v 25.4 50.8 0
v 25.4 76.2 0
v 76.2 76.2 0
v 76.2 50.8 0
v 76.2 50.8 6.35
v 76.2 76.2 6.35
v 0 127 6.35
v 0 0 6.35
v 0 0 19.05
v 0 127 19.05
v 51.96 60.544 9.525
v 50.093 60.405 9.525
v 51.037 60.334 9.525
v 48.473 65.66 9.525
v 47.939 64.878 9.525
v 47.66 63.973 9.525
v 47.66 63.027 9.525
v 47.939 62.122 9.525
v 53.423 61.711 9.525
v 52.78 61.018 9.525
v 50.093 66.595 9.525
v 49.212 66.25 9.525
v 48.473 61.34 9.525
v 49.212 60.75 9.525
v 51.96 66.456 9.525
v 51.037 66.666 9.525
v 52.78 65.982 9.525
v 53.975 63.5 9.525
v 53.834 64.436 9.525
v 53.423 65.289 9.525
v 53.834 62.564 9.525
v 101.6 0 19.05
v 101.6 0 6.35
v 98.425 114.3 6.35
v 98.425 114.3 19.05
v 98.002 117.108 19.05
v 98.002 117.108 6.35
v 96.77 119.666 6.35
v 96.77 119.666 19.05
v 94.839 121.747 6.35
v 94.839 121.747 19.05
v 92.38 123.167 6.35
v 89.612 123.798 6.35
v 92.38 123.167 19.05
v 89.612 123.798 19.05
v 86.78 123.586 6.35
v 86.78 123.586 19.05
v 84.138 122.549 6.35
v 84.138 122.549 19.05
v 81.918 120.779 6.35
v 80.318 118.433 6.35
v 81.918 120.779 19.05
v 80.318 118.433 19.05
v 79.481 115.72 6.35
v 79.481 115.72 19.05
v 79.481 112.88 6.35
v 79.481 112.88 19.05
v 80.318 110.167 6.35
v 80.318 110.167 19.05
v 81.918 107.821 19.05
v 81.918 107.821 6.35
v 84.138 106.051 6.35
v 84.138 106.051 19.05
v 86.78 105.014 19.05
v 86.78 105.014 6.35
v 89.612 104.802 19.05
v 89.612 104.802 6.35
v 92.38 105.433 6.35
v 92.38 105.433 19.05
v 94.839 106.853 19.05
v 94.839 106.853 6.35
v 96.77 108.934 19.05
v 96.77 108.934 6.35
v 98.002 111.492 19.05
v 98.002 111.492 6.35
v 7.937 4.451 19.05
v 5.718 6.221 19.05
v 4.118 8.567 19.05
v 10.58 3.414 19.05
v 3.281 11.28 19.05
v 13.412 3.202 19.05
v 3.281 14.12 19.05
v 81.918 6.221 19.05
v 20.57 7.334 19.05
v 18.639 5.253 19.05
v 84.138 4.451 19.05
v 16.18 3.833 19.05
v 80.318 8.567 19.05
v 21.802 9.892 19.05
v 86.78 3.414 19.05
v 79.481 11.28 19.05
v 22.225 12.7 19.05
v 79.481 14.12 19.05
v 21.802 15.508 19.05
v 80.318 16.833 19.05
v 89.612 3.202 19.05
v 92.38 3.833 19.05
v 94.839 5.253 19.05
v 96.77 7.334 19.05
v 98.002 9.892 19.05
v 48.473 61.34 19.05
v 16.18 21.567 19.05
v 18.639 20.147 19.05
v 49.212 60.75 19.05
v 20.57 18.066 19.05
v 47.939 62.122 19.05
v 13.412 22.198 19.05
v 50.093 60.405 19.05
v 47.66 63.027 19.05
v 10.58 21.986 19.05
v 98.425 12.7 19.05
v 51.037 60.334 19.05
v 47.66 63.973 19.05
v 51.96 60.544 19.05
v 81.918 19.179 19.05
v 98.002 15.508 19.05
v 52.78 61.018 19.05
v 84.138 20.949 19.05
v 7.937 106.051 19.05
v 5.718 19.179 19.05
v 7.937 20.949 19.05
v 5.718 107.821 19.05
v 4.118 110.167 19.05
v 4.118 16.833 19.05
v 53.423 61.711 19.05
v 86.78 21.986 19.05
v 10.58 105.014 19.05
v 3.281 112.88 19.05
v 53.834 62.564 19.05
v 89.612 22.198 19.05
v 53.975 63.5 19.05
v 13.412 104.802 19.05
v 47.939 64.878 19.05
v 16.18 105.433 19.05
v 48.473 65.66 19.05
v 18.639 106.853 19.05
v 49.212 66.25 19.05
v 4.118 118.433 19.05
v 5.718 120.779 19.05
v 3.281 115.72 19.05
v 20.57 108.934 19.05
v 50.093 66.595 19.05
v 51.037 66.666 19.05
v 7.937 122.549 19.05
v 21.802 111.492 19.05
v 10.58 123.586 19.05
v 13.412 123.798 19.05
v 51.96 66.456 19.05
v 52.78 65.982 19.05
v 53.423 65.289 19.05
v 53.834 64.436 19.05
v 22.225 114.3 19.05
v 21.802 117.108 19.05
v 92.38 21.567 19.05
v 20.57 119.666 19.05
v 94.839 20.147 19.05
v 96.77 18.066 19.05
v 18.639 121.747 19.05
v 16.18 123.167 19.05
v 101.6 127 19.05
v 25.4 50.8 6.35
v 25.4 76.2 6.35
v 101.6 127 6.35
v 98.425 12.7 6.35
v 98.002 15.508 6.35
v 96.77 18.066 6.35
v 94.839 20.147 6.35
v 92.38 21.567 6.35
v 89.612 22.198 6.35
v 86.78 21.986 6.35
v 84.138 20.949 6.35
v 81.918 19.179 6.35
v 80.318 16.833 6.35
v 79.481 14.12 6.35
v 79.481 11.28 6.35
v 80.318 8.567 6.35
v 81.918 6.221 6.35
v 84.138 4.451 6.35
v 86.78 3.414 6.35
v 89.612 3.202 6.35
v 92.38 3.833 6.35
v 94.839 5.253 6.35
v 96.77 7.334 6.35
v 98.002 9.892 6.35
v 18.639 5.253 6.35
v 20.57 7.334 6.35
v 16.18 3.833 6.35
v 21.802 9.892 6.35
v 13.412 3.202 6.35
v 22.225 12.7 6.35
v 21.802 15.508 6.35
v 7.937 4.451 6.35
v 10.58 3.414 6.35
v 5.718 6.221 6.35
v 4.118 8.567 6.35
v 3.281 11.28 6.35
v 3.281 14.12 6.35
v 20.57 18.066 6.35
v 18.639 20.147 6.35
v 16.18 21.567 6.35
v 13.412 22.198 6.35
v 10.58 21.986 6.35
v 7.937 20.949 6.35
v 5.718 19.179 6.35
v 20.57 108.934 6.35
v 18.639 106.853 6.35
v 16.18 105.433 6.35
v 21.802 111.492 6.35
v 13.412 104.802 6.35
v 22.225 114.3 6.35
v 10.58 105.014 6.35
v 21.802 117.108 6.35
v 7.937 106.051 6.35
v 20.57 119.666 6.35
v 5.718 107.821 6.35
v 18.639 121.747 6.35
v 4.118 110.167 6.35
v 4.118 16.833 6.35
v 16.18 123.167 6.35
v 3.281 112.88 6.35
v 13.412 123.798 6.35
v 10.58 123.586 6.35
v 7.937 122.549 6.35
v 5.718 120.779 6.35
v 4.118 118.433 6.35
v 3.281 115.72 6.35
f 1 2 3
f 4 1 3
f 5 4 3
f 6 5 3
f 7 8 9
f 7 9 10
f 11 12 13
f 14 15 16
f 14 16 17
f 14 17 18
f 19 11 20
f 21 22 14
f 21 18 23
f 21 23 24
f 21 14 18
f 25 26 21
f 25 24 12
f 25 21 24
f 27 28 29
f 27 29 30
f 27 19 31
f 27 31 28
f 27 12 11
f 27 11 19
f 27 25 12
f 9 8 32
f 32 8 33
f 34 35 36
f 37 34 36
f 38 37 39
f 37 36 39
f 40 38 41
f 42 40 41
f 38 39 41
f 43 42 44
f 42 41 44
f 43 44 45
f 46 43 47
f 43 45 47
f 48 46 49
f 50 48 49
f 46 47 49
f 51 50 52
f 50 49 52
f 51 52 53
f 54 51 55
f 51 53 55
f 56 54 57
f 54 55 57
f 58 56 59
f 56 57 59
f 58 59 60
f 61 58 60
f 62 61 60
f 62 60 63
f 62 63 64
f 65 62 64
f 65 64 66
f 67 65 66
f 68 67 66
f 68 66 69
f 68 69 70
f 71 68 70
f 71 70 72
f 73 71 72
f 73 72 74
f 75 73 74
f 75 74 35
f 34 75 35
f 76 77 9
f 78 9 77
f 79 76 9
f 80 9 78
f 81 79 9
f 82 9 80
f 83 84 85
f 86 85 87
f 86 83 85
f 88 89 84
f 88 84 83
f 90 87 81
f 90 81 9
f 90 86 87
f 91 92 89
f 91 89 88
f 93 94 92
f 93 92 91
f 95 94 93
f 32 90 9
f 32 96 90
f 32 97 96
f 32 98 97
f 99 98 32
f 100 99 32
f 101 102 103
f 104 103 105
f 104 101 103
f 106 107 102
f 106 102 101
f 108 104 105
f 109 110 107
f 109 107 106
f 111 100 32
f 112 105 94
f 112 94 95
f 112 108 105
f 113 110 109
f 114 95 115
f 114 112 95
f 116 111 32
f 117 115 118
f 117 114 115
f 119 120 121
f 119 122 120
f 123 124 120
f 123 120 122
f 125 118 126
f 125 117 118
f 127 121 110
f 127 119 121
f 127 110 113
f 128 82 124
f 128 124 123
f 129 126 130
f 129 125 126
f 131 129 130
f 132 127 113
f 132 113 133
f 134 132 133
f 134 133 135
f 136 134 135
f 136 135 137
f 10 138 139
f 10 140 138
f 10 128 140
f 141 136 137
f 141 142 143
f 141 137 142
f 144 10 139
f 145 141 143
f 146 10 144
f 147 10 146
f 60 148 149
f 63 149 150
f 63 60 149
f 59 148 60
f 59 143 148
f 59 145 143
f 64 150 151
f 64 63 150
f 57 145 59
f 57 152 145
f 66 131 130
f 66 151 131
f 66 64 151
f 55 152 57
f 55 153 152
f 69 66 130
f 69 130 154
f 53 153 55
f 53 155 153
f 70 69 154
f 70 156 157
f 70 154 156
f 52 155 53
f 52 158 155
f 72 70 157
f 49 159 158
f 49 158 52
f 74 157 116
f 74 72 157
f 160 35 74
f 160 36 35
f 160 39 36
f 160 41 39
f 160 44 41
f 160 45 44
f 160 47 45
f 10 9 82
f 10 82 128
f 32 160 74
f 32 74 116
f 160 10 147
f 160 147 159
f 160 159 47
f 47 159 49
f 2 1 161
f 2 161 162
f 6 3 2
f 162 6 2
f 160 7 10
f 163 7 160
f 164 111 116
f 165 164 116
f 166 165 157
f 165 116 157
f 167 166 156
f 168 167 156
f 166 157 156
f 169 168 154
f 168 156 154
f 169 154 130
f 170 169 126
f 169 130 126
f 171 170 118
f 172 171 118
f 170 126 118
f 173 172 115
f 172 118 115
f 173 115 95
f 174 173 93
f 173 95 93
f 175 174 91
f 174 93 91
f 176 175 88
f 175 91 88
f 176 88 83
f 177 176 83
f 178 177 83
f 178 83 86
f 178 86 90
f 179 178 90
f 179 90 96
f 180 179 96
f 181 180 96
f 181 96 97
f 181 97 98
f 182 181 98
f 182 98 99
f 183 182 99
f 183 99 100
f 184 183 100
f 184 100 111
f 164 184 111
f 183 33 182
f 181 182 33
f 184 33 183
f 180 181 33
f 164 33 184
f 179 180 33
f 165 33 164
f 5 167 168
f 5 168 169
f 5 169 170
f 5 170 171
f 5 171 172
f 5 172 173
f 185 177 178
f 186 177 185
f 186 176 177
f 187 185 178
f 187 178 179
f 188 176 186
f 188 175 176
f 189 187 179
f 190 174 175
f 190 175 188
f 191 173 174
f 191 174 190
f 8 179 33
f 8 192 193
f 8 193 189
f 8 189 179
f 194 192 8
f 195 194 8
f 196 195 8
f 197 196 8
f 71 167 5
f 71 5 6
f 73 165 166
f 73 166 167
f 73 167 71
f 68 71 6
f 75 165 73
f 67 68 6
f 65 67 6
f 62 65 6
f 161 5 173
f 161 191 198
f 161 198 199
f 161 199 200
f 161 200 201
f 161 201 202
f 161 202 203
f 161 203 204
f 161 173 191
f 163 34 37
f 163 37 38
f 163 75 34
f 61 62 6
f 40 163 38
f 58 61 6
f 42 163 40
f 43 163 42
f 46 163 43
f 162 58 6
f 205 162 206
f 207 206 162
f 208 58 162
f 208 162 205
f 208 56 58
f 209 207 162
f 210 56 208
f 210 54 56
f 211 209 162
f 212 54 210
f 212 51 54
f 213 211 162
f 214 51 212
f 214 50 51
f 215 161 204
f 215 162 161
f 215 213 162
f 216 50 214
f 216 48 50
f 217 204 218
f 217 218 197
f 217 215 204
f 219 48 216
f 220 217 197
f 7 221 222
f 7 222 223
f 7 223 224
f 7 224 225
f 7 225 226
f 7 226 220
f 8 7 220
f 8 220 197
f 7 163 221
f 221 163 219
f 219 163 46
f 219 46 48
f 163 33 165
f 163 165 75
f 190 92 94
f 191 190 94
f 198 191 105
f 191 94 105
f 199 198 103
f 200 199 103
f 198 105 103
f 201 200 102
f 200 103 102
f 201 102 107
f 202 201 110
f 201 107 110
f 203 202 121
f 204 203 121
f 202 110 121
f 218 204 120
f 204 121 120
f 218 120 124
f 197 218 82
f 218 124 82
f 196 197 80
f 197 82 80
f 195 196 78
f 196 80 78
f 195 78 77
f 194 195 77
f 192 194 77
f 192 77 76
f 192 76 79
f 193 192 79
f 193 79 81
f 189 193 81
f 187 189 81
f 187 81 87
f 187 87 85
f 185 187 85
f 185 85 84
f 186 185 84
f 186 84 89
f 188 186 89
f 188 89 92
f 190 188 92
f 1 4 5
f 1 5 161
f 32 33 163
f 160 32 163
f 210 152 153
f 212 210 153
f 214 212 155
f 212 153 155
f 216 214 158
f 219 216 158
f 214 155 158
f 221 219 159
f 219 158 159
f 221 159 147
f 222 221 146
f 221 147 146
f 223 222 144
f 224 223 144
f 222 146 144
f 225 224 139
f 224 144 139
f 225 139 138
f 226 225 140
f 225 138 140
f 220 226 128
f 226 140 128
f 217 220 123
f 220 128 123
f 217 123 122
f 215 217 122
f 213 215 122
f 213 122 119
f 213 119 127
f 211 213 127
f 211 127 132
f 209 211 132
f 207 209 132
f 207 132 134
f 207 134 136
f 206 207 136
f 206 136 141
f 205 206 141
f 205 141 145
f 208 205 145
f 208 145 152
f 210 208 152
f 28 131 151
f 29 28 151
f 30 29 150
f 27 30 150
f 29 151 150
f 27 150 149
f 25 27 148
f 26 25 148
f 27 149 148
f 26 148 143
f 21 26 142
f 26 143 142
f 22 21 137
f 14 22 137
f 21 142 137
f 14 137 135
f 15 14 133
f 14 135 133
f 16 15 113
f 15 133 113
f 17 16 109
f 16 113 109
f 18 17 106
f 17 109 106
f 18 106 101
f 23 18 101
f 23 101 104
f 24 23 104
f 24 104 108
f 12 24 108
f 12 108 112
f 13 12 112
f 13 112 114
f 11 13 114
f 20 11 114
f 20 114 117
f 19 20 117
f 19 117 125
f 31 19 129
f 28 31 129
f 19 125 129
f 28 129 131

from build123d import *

# Parameters (mm, degrees)
SKETCH1_W           = 101.6
SKETCH1_H           = 127
BOSS_EXTRUDE1_DEPTH = 19.05
SKETCH2_W           = 25.4
SKETCH2_H           = 127
CUT_EXTRUDE1_DEPTH  = 6.35
CUT_EXTRUDE2_REACH  = 165.751
SKETCH4_R           = 6.35
SKETCH9_W           = 50.8
SKETCH9_H           = 50.8
CUT_EXTRUDE7_DEPTH  = 6.35
SKETCH11_R          = 3.175
CUT_EXTRUDE8_DEPTH  = 9.525
SKETCH12_R          = 9.525
CUT_EXTRUDE9_DEPTH  = 164.751221369


with BuildPart() as part:
    # Sketch1 → Boss-Extrude1 (new body)
    with BuildSketch(Plane.XY):
        with Locations((50.8, 63.5)):
            Rectangle(SKETCH1_W, SKETCH1_H)
    extrude(amount=BOSS_EXTRUDE1_DEPTH)

    # Sketch2 → Cut-Extrude1 (cut)
    with BuildSketch(Plane(origin=(0, 0, 0), x_dir=(-1, 0, 0), z_dir=(0, 0, -1))):
        with Locations((-88.9, 63.5)):
            Rectangle(SKETCH2_W, SKETCH2_H)
        with Locations((-12.7, 63.5)):
            Rectangle(SKETCH2_W, SKETCH2_H)
    extrude(amount=-CUT_EXTRUDE1_DEPTH, mode=Mode.SUBTRACT)

    # Sketch4 → Cut-Extrude2 (cut, up to next)
    with BuildSketch(Plane.XY.offset(19.05), mode=Mode.PRIVATE) as cut_extrude2_sk1:
        with Locations((12.7, 114.3)):
            Circle(SKETCH4_R)
    cut_extrude2_tool1 = extrude(cut_extrude2_sk1.sketch, amount=-CUT_EXTRUDE2_REACH, mode=Mode.PRIVATE) & part.part
    # Sketch4 → Cut-Extrude2 (cut, up to next)
    with BuildSketch(Plane.XY.offset(19.05), mode=Mode.PRIVATE) as cut_extrude2_sk2:
        with Locations((12.7, 12.7)):
            Circle(SKETCH4_R)
    cut_extrude2_tool2 = extrude(cut_extrude2_sk2.sketch, amount=-CUT_EXTRUDE2_REACH, mode=Mode.PRIVATE) & part.part
    # Sketch4 → Cut-Extrude2 (cut, up to next)
    with BuildSketch(Plane.XY.offset(19.05), mode=Mode.PRIVATE) as cut_extrude2_sk3:
        with Locations(Location((88.9, 12.7, 0), (0, 0, 180))):
            Circle(SKETCH4_R)
    cut_extrude2_tool3 = extrude(cut_extrude2_sk3.sketch, amount=-CUT_EXTRUDE2_REACH, mode=Mode.PRIVATE) & part.part
    # Sketch4 → Cut-Extrude2 (cut, up to next)
    with BuildSketch(Plane.XY.offset(19.05), mode=Mode.PRIVATE) as cut_extrude2_sk4:
        with Locations(Location((88.9, 114.3, 0), (0, 0, 180))):
            Circle(SKETCH4_R)
    cut_extrude2_tool4 = extrude(cut_extrude2_sk4.sketch, amount=-CUT_EXTRUDE2_REACH, mode=Mode.PRIVATE) & part.part
    add(cut_extrude2_tool1.solids().sort_by_distance((12.7, 114.3, 19.05))[0], mode=Mode.SUBTRACT)
    add(cut_extrude2_tool2.solids().sort_by_distance((12.7, 12.7, 19.05))[0], mode=Mode.SUBTRACT)
    add(cut_extrude2_tool3.solids().sort_by_distance((88.9, 12.7, 19.05))[0], mode=Mode.SUBTRACT)
    add(cut_extrude2_tool4.solids().sort_by_distance((88.9, 114.3, 19.05))[0], mode=Mode.SUBTRACT)

    # Sketch9 → Cut-Extrude7 (cut)
    with BuildSketch(Plane(origin=(0, 0, 0), x_dir=(-1, 0, 0), z_dir=(0, 0, -1))):
        with Locations((-50.8, 25.4)):
            Rectangle(SKETCH9_W, SKETCH9_H)
        with Locations((-50.8, 101.6)):
            Rectangle(SKETCH9_W, SKETCH9_H)
    extrude(amount=-CUT_EXTRUDE7_DEPTH, mode=Mode.SUBTRACT)

    # Sketch11 → Cut-Extrude8 (cut)
    with BuildSketch(Plane.XY.offset(19.05)):
        with Locations((50.8, 63.5)):
            Circle(SKETCH11_R)
    extrude(amount=-CUT_EXTRUDE8_DEPTH, mode=Mode.SUBTRACT)

    # Sketch12 → Cut-Extrude9 (cut, through all)
    with BuildSketch(Plane.XY.offset(19.05)):
        with Locations((12.7, 114.3)):
            Circle(SKETCH12_R)
        with Locations((88.9, 114.3)):
            Circle(SKETCH12_R)
        with Locations((12.7, 12.7)):
            Circle(SKETCH12_R)
        with Locations((88.9, 12.7)):
            Circle(SKETCH12_R)
        with Locations((88.632472784, -89.675466105)):
            Circle(SKETCH12_R)
    extrude(amount=-CUT_EXTRUDE9_DEPTH, mode=Mode.SUBTRACT)


solid = part.part
